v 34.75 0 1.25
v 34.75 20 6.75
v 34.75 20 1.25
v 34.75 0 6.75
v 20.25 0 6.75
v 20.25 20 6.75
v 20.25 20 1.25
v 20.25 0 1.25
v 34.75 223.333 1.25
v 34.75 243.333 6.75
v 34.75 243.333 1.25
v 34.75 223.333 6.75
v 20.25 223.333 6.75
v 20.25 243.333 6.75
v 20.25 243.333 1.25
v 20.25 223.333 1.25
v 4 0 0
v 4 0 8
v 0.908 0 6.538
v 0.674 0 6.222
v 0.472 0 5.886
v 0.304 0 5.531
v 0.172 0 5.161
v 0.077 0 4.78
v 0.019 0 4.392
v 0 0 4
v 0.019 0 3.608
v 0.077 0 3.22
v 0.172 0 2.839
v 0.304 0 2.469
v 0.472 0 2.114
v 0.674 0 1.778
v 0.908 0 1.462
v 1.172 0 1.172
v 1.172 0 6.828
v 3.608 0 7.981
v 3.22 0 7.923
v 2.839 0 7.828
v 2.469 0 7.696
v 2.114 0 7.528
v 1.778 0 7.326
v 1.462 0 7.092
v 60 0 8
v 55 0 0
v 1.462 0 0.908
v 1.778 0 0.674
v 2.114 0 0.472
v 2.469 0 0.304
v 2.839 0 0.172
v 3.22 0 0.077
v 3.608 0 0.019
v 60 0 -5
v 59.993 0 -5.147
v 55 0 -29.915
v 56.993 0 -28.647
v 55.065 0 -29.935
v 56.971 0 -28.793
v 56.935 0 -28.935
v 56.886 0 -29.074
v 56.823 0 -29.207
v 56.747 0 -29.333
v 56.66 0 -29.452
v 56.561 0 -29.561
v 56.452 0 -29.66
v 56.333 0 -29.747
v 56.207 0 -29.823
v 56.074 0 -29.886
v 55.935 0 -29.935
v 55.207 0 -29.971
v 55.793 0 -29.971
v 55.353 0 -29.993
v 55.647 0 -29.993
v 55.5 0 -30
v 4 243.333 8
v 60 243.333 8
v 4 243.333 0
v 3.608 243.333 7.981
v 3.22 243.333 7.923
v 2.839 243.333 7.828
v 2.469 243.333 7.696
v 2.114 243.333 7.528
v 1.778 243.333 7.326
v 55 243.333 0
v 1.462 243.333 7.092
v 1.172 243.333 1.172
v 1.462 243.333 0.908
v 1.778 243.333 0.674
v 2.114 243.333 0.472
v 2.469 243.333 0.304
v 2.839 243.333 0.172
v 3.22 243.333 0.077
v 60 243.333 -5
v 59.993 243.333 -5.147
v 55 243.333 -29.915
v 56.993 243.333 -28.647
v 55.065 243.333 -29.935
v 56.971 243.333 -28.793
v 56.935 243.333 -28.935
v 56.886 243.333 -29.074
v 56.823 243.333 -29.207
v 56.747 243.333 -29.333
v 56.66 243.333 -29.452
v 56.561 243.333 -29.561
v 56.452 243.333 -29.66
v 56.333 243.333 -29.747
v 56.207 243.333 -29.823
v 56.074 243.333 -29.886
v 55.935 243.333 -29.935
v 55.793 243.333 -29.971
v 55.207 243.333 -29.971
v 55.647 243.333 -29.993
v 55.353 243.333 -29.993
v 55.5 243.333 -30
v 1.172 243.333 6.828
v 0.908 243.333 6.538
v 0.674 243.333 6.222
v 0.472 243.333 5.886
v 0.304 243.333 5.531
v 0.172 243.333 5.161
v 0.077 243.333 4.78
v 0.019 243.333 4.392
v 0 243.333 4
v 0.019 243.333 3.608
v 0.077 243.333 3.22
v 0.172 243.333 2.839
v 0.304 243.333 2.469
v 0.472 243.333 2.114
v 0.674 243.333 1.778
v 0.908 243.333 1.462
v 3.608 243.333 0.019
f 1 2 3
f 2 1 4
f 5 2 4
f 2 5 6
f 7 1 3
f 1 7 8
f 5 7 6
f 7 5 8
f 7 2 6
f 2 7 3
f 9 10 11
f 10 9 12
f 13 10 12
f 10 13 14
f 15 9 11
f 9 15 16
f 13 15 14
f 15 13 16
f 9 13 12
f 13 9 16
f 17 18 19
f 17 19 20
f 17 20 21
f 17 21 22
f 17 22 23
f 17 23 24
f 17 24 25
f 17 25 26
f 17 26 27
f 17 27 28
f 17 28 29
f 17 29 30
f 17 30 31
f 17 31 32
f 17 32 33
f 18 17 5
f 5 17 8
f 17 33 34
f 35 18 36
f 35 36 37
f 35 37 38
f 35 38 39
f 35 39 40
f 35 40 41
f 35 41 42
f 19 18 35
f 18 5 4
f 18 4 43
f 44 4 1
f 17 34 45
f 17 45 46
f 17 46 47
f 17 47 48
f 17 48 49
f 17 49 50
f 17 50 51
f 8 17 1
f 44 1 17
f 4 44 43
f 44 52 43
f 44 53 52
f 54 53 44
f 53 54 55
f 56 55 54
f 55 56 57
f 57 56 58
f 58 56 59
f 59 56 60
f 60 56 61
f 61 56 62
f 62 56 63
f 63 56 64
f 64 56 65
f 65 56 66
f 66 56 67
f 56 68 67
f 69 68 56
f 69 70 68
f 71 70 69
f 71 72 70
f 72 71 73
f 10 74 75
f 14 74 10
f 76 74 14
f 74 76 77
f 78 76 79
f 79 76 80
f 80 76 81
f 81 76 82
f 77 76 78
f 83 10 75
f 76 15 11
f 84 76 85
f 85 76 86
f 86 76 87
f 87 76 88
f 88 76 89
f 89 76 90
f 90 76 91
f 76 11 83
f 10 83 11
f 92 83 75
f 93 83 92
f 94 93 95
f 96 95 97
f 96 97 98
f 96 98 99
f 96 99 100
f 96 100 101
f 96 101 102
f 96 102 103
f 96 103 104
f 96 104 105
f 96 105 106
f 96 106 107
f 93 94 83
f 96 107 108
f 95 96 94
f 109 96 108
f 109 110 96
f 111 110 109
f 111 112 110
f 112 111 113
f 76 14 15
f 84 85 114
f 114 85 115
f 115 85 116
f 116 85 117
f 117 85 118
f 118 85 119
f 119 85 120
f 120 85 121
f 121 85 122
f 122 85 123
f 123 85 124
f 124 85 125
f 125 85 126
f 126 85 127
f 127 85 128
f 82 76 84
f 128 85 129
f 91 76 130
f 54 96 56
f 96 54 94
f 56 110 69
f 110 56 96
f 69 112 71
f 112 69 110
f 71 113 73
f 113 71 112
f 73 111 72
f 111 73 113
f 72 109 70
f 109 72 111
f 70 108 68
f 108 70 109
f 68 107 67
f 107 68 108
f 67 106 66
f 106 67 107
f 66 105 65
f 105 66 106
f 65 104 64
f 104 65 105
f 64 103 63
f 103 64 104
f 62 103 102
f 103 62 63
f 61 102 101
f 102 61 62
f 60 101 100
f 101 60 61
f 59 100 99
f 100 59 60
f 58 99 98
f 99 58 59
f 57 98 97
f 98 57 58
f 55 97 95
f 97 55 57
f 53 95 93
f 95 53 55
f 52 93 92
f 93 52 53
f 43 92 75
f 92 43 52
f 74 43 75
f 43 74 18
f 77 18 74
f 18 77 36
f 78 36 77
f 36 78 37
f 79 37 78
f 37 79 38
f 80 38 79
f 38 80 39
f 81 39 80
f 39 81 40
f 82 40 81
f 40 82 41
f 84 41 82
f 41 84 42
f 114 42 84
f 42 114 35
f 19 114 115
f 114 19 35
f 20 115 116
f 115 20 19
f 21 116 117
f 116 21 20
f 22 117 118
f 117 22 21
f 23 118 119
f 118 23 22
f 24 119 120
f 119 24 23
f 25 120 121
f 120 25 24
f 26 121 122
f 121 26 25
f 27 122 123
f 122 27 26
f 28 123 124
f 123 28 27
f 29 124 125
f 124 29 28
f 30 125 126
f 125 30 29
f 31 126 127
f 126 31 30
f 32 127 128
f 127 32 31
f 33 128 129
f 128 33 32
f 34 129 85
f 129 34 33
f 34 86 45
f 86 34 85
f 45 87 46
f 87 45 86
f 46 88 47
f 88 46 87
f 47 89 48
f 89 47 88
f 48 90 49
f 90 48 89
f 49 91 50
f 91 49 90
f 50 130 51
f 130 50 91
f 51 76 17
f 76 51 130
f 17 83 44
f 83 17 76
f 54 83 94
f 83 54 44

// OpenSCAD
/* [Visningsläge och Layout] */
// Välj visning av foderdelarna
view_mode = "straight"; // [assembly: Komplett fodermontage, print_layout: Utskriftslayout alla delar, corner: Enskild hörnbit, straight: Enskild rak sektion, splice_key: Enskilt skarvkex]

/* [Val av sidor] */
// Ta med överstycke topp
include_top = true;

// Ta med understycke botten
include_bottom = false;

// Ta med vänster sida
include_left = true;

// Ta med höger sida
include_right = true;

/* [Fönsterstorlek och Automatisk beräkning] */
// Fönstrets dagmått öppningsbredd mm
window_width = 900; // [300:50:2000]

// Fönstrets dagmått öppningshöjd mm
window_height = 800; // [300:50:2200]

// Maxlängd per utskriven bit mm
max_piece_length = 270; // [100:10:300]

// Hörnbitens benlängd mm
corner_arm_length = 130; // [70:5:200]

/* [Mått Profil] */
// Fodrets totala bredd på väggen mm
casing_width = 60; // [40:1:120]

// Fodrets tjocklek mm
casing_thickness = 8; // [8:1:25]

// Avrundningsradie på ytterkant framsida mm
edge_radius = 4; // [0.5:0.5:10]

// Klackens djup in i fönsterkarm smyg mm
klack_depth = 30; // [4:1:35]

// Klackens tjocklek bredd mm
klack_thickness = 5; // [4:1:25]

// Innerhörnets radie i falsen mm
inner_corner_radius = 0; // [0.0:0.5:3.0]

// Profilstil
profile_style = "klackfoder"; // [klackfoder: Klackfoder med ren 90 graders fals, slat_single: Slät med en rundad ytterkant, slat_double: Slät med två rundade kanter, allmoge: Klassisk allmogeprofil]

/* [Klack Avfasning] */
// Avfasad klack med mjuk övergång
enable_klack_chamfer = true;

// Avfasningens bredd i botten mm
klack_chamfer_width = 15; // [1:0.5:15]

// Avfasningens höjd på sidan mm
klack_chamfer_depth = 25; // [1:0.5:25]

// Mjuk övergångsradie mm
chamfer_blend_radius = 1.5; // [0.5:0.5:4]

/* [Skarvning och Montering] */
// Invändiga fickor för skarvkex
enable_splice_slots = true;

// Toleransglapp för skarvkex mm
joint_clearance = 0.25; // [0.1:0.05:0.5]

// Dekorativ 45 graders geringslinje på hörnet
decorative_miter_line = false;

// Försänkta monteringshål
enable_screw_holes = false;

// Skruvhålsdiameter mm
screw_diameter = 4; // [3.0:0.5:6.0]

/* [Färger] */
casing_color = "#F4F5F7"; // Vit foderfärg
key_color = "#C88A4A";    // Träfärg kex

/* [Kvalitet] */
$fn = 64;

// Bredd på den plana raka delen av fodret
flat_portion_width = (profile_style == "klackfoder") ? (casing_width - klack_thickness) : casing_width;

// Skarvens centrering mitt i den raka delen
slot_center_pos = flat_portion_width / 2;

// Kexets dimensioner
pocket_w = 14 + joint_clearance * 2;
pocket_h = 5 + joint_clearance * 2;
pocket_depth = 20;

//-------------------------------------------------------------
// LOGIK FÖR HÖRN OCH SIDOR
//-------------------------------------------------------------

has_tl = include_top && include_left;
has_tr = include_top && include_right;
has_bl = include_bottom && include_left;
has_br = include_bottom && include_right;

total_corners = (has_tl ? 1 : 0) + (has_tr ? 1 : 0) + (has_bl ? 1 : 0) + (has_br ? 1 : 0);

corner_reach = corner_arm_length - casing_width;

top_start_x = has_tl ? corner_reach : 0;
top_end_x = has_tr ? (window_width - corner_reach) : window_width;
top_span = include_top ? max(0, top_end_x - top_start_x) : 0;
num_top_pieces = (top_span > 0) ? ceil(top_span / max_piece_length) : 0;
top_piece_len = (num_top_pieces > 0) ? (top_span / num_top_pieces) : 0;

bot_start_x = has_bl ? corner_reach : 0;
bot_end_x = has_br ? (window_width - corner_reach) : window_width;
bot_span = include_bottom ? max(0, bot_end_x - bot_start_x) : 0;
num_bot_pieces = (bot_span > 0) ? ceil(bot_span / max_piece_length) : 0;
bot_piece_len = (num_bot_pieces > 0) ? (bot_span / num_bot_pieces) : 0;

left_start_y = has_bl ? corner_reach : 0;
left_end_y = has_tl ? (window_height - corner_reach) : window_height;
left_span = include_left ? max(0, left_end_y - left_start_y) : 0;
num_left_pieces = (left_span > 0) ? ceil(left_span / max_piece_length) : 0;
left_piece_len = (num_left_pieces > 0) ? (left_span / num_left_pieces) : 0;

right_start_y = has_br ? corner_reach : 0;
right_end_y = has_tr ? (window_height - corner_reach) : window_height;
right_span = include_right ? max(0, right_end_y - right_start_y) : 0;
num_right_pieces = (right_span > 0) ? ceil(right_span / max_piece_length) : 0;
right_piece_len = (num_right_pieces > 0) ? (right_span / num_right_pieces) : 0;

total_straights = num_top_pieces + num_bot_pieces + num_left_pieces + num_right_pieces;

keys_from_corners = (has_tl ? 2 : 0) + (has_tr ? 2 : 0) + (has_bl ? 2 : 0) + (has_br ? 2 : 0);
keys_from_top = (num_top_pieces > 1) ? (num_top_pieces - 1) : 0;
keys_from_bot = (num_bot_pieces > 1) ? (num_bot_pieces - 1) : 0;
keys_from_left = (num_left_pieces > 1) ? (num_left_pieces - 1) : 0;
keys_from_right = (num_right_pieces > 1) ? (num_right_pieces - 1) : 0;
total_keys = keys_from_corners + keys_from_top + keys_from_bot + keys_from_left + keys_from_right;

//-------------------------------------------------------------
// HUVUDLOGIK
//-------------------------------------------------------------

if (view_mode == "assembly") {
    foder_only_assembly();
} else if (view_mode == "print_layout") {
    full_kit_print_layout();
} else if (view_mode == "corner") {
    color(casing_color)
        mitered_corner_part(corner_arm_length);
} else if (view_mode == "straight") {
    sample_len = (num_left_pieces > 0) ? left_piece_len : (num_top_pieces > 0 ? top_piece_len : max_piece_length);
    color(casing_color)
        straight_piece_part(sample_len);
} else if (view_mode == "splice_key") {
    color(key_color)
        splice_key_part();
}

//-------------------------------------------------------------
// 2D PROFIL
//-------------------------------------------------------------
module foder_profile_2d() {
    if (profile_style == "klackfoder") {
        difference() {
            union() {
                // Huvudbräda
                hull() {
                    translate([edge_radius, edge_radius]) circle(r=edge_radius);
                    translate([edge_radius, casing_thickness - edge_radius]) circle(r=edge_radius);
                    translate([casing_width - 0.5, 0]) square([0.5, casing_thickness]);
                }
                
                // Klack med valbar mjuk avfasning enligt användarens skiss
                klack_2d();
            }
            // Valfri innerradie i 90-graders falsen
            if (inner_corner_radius > 0) {
                translate([casing_width - klack_thickness, 0])
                difference() {
                    translate([-inner_corner_radius, -inner_corner_radius])
                        square([inner_corner_radius, inner_corner_radius]);
                    translate([-inner_corner_radius, 0])
                        circle(r=inner_corner_radius);
                }
            }
        }
    } else if (profile_style == "slat_single") {
        hull() {
            translate([edge_radius, edge_radius]) circle(r=edge_radius);
            translate([edge_radius, casing_thickness - edge_radius]) circle(r=edge_radius);
            translate([casing_width - 0.5, 0]) square([0.5, casing_thickness]);
        }
    } else if (profile_style == "slat_double") {
        hull() {
            translate([edge_radius, edge_radius]) circle(r=edge_radius);
            translate([edge_radius, casing_thickness - edge_radius]) circle(r=edge_radius);
            translate([casing_width - edge_radius, edge_radius]) circle(r=edge_radius);
            translate([casing_width - edge_radius, casing_thickness - edge_radius]) circle(r=edge_radius);
        }
    } else if (profile_style == "allmoge") {
        difference() {
            square([casing_width, casing_thickness]);
            translate([9, casing_thickness + 3.5]) circle(r=9);
            translate([17, casing_thickness + 0.2]) circle(r=2.5);
            translate([casing_width * 0.56, casing_thickness + 7.5]) circle(r=10.5);
            translate([casing_width - 11, casing_thickness + 0.5]) circle(r=2.5);
            translate([casing_width, casing_thickness]) circle(r=1.5);
        }
    }
}

// 2D Klack med mjuk avfasning på ytterhörnet
module klack_2d() {
    x0 = casing_width - klack_thickness;
    x1 = casing_width;
    y0 = -klack_depth;
    
    if (enable_klack_chamfer) {
        ch_x = min(klack_chamfer_width, klack_thickness - 0.5);
        ch_y = min(klack_chamfer_depth, klack_depth - 0.5);
        r = min(chamfer_blend_radius, min(ch_x, ch_y) / 2);
        
        difference() {
            // Rektangulär grundklack
            translate([x0, y0]) square([klack_thickness, klack_depth]);
            
            // Subtrahera det yttre hörnet med mjukt övergående fas
            translate([x1, y0])
            difference() {
                translate([-ch_x - 1, -1])
                    square([ch_x + 2, ch_y + 2]);
                    
                hull() {
                    translate([-ch_x, r])
                        circle(r=r);
                    translate([-r, ch_y])
                        circle(r=r);
                    translate([-ch_x - 5, r])
                        square([5, ch_y]);
                    translate([-ch_x - 5, ch_y])
                        square([ch_x + 5, 5]);
                }
            }
        }
    } else {
        translate([x0, y0]) square([klack_thickness, klack_depth]);
    }
}

//-------------------------------------------------------------
// SKARVKEX OCH HÅL
//-------------------------------------------------------------
module splice_key_part() {
    kw = 14 - joint_clearance * 2;
    kh = 5 - joint_clearance * 2;
    kl = 38;
    
    difference() {
        hull() {
            translate([1, 1, 1]) cube([kw - 2, kl - 2, kh - 2]);
            translate([2, 2, 0]) cube([kw - 4, kl - 4, kh]);
        }
        translate([-1, kl / 2 - 0.75, -1])
            cube([kw + 2, 1.5, kh + 2]);
    }
}

module countersunk_hole() {
    cylinder(d=screw_diameter, h=casing_thickness * 4, center=true);
    translate([0, 0, casing_thickness - 3.2])
        cylinder(d1=screw_diameter, d2=screw_diameter * 2.2, h=3.5);
    translate([0, 0, casing_thickness + 0.2])
        cylinder(d=screw_diameter * 2.2, h=10);
}

//-------------------------------------------------------------
// 90 GRADERS HÖRNBIT
//-------------------------------------------------------------
module mitered_corner_part(arm_len) {
    cut_box = arm_len * 3;
    z_min = -klack_depth - 10;
    z_h = casing_thickness + klack_depth + 20;
    
    difference() {
        union() {
            difference() {
                multmatrix([
                    [0, 0, 1, 0],
                    [1, 0, 0, 0],
                    [0, 1, 0, 0],
                    [0, 0, 0, 1]
                ])
                linear_extrude(height=arm_len)
                    foder_profile_2d();
                    
                rotate([0, 0, 45])
                translate([-cut_box / 2, 0, z_min])
                    cube([cut_box, cut_box, z_h]);
            }
            
            difference() {
                multmatrix([
                    [1, 0, 0, 0],
                    [0, 0, 1, 0],
                    [0, 1, 0, 0],
                    [0, 0, 0, 1]
                ])
                linear_extrude(height=arm_len)
                    foder_profile_2d();
                    
                rotate([0, 0, 45])
                translate([-cut_box / 2, -cut_box, z_min])
                    cube([cut_box, cut_box, z_h]);
            }
        }
        
        if (decorative_miter_line) {
            rotate([0, 0, 45])
            translate([0, 0, casing_thickness])
            rotate([45, 0, 0])
            translate([0, -0.4, -0.4])
                cube([casing_width * 1.5, 0.8, 0.8]);
        }
        
        if (enable_splice_slots) {
            translate([arm_len - pocket_depth, slot_center_pos - pocket_w / 2, casing_thickness / 2 - pocket_h / 2])
                cube([pocket_depth + 1, pocket_w, pocket_h]);
                
            translate([slot_center_pos - pocket_w / 2, arm_len - pocket_depth, casing_thickness / 2 - pocket_h / 2])
                cube([pocket_w, pocket_depth + 1, pocket_h]);
        }
        
        if (enable_screw_holes) {
            translate([arm_len * 0.65, slot_center_pos, 0])
                countersunk_hole();
            translate([slot_center_pos, arm_len * 0.65, 0])
                countersunk_hole();
        }
    }
}

//-------------------------------------------------------------
// RAK FODERSEKTION
//-------------------------------------------------------------
module straight_piece_part(len) {
    difference() {
        multmatrix([
            [1, 0, 0, 0],
            [0, 0, 1, 0],
            [0, 1, 0, 0],
            [0, 0, 0, 1]
        ])
        linear_extrude(height=len)
            foder_profile_2d();
            
        if (enable_splice_slots) {
            translate([slot_center_pos - pocket_w / 2, -1, casing_thickness / 2 - pocket_h / 2])
                cube([pocket_w, pocket_depth + 1, pocket_h]);
                
            translate([slot_center_pos - pocket_w / 2, len - pocket_depth, casing_thickness / 2 - pocket_h / 2])
                cube([pocket_w, pocket_depth + 1, pocket_h]);
        }
        
        if (enable_screw_holes) {
            if (len >= 120) {
                translate([slot_center_pos, 35, 0]) countersunk_hole();
                translate([slot_center_pos, len - 35, 0]) countersunk_hole();
            } else {
                translate([slot_center_pos, len / 2, 0]) countersunk_hole();
            }
        }
    }
}

//-------------------------------------------------------------
// FODERMONTAGE
//-------------------------------------------------------------
module foder_only_assembly() {
    W = window_width;
    H = window_height;
    
    color(casing_color) {
        if (has_bl) {
            translate([-casing_width, -casing_width, 0])
                mitered_corner_part(corner_arm_length);
        }
        if (has_br) {
            translate([W, 0, 0])
            mirror([1, 0, 0])
            translate([-casing_width, -casing_width, 0])
                mitered_corner_part(corner_arm_length);
        }
        if (has_tl) {
            translate([0, H, 0])
            mirror([0, 1, 0])
            translate([-casing_width, -casing_width, 0])
                mitered_corner_part(corner_arm_length);
        }
        if (has_tr) {
            translate([W, H, 0])
            mirror([1, 0, 0])
            mirror([0, 1, 0])
            translate([-casing_width, -casing_width, 0])
                mitered_corner_part(corner_arm_length);
        }
    }
    
    if (include_top && num_top_pieces > 0) {
        color(casing_color) {
            for (i = [0 : num_top_pieces - 1]) {
                x_pos = top_start_x + i * top_piece_len;
                translate([x_pos, H + casing_width, 0])
                multmatrix([
                    [0, 1, 0, 0],
                    [-1, 0, 0, 0],
                    [0, 0, 1, 0],
                    [0, 0, 0, 1]
                ])
                    straight_piece_part(top_piece_len);
            }
        }
    }
    
    if (include_bottom && num_bot_pieces > 0) {
        color(casing_color) {
            for (i = [0 : num_bot_pieces - 1]) {
                x_pos = bot_start_x + i * bot_piece_len;
                translate([x_pos, -casing_width, 0])
                multmatrix([
                    [0, 1, 0, 0],
                    [1, 0, 0, 0],
                    [0, 0, 1, 0],
                    [0, 0, 0, 1]
                ])
                    straight_piece_part(bot_piece_len);
            }
        }
    }
    
    if (include_left && num_left_pieces > 0) {
        color(casing_color) {
            for (j = [0 : num_left_pieces - 1]) {
                y_pos = left_start_y + j * left_piece_len;
                translate([-casing_width, y_pos, 0])
                    straight_piece_part(left_piece_len);
            }
        }
    }
    
    if (include_right && num_right_pieces > 0) {
        color(casing_color) {
            for (j = [0 : num_right_pieces - 1]) {
                y_pos = right_start_y + j * right_piece_len;
                translate([W + casing_width, y_pos, 0])
                mirror([1, 0, 0])
                    straight_piece_part(right_piece_len);
            }
        }
    }
}

//-------------------------------------------------------------
// UTSKRIFTSLAYOUT ALLA DELAR FÖR DE VALDA SIDORNA
//-------------------------------------------------------------
module full_kit_print_layout() {
    spacing_x = casing_width + 15;
    corner_spacing = corner_arm_length + 20;
    
    if (total_corners > 0) {
        color(casing_color) {
            for (c = [0 : total_corners - 1]) {
                translate([c * corner_spacing, 0, 0])
                    mitered_corner_part(corner_arm_length);
            }
        }
    }
    
    y_straight_start = (total_corners > 0) ? (corner_arm_length + 25) : 0;
    
    color(casing_color) {
        if (num_top_pieces > 0) {
            for (t = [0 : num_top_pieces - 1]) {
                translate([t * spacing_x, y_straight_start, 0])
                    straight_piece_part(top_piece_len);
            }
        }
        
        offset_bot = num_top_pieces * spacing_x;
        if (num_bot_pieces > 0) {
            for (b = [0 : num_bot_pieces - 1]) {
                translate([offset_bot + b * spacing_x, y_straight_start, 0])
                    straight_piece_part(bot_piece_len);
            }
        }
        
        offset_left = (num_top_pieces + num_bot_pieces) * spacing_x;
        if (num_left_pieces > 0) {
            for (l = [0 : num_left_pieces - 1]) {
                translate([offset_left + l * spacing_x, y_straight_start, 0])
                    straight_piece_part(left_piece_len);
            }
        }
        
        offset_right = (num_top_pieces + num_bot_pieces + num_left_pieces) * spacing_x;
        if (num_right_pieces > 0) {
            for (r = [0 : num_right_pieces - 1]) {
                translate([offset_right + r * spacing_x, y_straight_start, 0])
                    straight_piece_part(right_piece_len);
            }
        }
    }
    
    if (total_keys > 0) {
        keys_per_row = 12;
        color(key_color) {
            for (k = [0 : total_keys - 1]) {
                row = floor(k / keys_per_row);
                col = k % keys_per_row;
                translate([col * 22, -45 - row * 45, 0])
                rotate([0, 0, 90])
                    splice_key_part();
            }
        }
    }
}
